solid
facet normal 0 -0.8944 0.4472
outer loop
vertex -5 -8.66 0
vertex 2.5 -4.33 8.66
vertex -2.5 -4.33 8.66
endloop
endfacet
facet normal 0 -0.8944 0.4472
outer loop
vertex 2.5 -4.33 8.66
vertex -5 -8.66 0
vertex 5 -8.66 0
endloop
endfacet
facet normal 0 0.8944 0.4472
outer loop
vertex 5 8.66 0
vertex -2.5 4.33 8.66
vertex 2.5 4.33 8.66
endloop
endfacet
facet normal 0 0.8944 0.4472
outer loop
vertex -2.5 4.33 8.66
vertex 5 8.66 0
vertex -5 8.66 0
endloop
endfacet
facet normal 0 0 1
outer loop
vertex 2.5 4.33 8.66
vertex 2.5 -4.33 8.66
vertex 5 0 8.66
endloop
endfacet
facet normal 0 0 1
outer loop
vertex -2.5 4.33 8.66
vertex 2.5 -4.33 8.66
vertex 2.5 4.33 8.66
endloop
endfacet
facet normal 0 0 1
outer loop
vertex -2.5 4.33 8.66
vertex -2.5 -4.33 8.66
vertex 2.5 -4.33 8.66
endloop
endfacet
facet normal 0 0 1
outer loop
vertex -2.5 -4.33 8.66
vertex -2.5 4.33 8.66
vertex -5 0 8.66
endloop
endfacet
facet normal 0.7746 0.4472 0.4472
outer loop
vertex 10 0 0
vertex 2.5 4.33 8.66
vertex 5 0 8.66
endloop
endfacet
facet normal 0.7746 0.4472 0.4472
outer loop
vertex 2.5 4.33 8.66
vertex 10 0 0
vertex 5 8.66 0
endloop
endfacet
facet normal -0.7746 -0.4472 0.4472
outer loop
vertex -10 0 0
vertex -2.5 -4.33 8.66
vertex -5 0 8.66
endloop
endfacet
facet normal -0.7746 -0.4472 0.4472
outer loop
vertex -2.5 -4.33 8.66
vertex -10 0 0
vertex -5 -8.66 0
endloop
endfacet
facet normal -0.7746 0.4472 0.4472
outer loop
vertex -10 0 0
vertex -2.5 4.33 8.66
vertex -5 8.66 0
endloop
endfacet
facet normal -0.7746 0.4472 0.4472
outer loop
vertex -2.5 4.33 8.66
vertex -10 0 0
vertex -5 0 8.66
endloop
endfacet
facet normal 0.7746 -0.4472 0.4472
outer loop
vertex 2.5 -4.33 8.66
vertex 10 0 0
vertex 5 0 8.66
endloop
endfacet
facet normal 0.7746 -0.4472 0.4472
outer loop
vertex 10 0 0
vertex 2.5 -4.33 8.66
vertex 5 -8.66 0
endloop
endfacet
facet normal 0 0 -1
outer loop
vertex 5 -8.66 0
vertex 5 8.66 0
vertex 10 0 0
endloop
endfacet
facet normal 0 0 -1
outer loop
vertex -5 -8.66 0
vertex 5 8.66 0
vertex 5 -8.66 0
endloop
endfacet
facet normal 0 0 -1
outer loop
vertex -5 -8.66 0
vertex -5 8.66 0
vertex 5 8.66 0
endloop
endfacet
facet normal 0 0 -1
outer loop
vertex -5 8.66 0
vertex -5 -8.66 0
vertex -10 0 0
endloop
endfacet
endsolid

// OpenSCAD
/* [Global] */


/* [Resolution] */

resolution = 6; // [6:100]



/* [Hidden] */

dome_size= 10;


print_part();

module print_part() {
	
	// this will create a high resolution sphere with parametric resolution

	difference()
	{
	
		sphere (dome_size,$fn=resolution);

		translate([0,0,-dome_size])
		
		{
		cube(dome_size*2, center =true);

		//cylinder(r=2, h=20, center= true, $nf=40);

		}	
	}
	
}
